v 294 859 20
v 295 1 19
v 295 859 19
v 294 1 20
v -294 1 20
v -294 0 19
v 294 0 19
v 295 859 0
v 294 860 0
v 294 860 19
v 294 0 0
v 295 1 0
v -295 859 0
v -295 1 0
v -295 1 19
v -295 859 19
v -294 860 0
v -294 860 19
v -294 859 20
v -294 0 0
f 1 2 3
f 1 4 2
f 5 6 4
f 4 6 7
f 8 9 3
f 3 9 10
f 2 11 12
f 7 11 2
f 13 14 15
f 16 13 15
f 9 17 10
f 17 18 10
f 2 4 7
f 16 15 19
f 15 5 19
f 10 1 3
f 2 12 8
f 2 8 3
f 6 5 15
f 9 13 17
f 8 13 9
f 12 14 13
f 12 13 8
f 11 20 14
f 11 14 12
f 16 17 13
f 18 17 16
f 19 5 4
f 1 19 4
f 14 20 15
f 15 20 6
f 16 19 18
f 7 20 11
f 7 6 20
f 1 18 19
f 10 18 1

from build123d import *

# Parameters (mm, degrees)
F0_W     = 590
F0_H     = 20
F1_DEPTH = 860
F2_SIZE  = 1


with BuildPart() as f1:
    # F0 (on Front) → F1 (new body)
    with BuildSketch(Plane.XZ):
        with Locations((0, 10)):
            Rectangle(F0_W, F0_H)
    extrude(amount=-F1_DEPTH)

    # F2
    f2_edges = [f1.edges().sort_by_distance(p)[0] for p in [
        (295, 430, 20),
        (-295, 430, 20),
        (0, 0, 20),
        (0, 860, 20),
        (295, 0, 10),
        (295, 860, 10),
        (-295, 0, 10),
        (-295, 860, 10),
    ]]
    chamfer(f2_edges, length=F2_SIZE)


solid = f1.part
